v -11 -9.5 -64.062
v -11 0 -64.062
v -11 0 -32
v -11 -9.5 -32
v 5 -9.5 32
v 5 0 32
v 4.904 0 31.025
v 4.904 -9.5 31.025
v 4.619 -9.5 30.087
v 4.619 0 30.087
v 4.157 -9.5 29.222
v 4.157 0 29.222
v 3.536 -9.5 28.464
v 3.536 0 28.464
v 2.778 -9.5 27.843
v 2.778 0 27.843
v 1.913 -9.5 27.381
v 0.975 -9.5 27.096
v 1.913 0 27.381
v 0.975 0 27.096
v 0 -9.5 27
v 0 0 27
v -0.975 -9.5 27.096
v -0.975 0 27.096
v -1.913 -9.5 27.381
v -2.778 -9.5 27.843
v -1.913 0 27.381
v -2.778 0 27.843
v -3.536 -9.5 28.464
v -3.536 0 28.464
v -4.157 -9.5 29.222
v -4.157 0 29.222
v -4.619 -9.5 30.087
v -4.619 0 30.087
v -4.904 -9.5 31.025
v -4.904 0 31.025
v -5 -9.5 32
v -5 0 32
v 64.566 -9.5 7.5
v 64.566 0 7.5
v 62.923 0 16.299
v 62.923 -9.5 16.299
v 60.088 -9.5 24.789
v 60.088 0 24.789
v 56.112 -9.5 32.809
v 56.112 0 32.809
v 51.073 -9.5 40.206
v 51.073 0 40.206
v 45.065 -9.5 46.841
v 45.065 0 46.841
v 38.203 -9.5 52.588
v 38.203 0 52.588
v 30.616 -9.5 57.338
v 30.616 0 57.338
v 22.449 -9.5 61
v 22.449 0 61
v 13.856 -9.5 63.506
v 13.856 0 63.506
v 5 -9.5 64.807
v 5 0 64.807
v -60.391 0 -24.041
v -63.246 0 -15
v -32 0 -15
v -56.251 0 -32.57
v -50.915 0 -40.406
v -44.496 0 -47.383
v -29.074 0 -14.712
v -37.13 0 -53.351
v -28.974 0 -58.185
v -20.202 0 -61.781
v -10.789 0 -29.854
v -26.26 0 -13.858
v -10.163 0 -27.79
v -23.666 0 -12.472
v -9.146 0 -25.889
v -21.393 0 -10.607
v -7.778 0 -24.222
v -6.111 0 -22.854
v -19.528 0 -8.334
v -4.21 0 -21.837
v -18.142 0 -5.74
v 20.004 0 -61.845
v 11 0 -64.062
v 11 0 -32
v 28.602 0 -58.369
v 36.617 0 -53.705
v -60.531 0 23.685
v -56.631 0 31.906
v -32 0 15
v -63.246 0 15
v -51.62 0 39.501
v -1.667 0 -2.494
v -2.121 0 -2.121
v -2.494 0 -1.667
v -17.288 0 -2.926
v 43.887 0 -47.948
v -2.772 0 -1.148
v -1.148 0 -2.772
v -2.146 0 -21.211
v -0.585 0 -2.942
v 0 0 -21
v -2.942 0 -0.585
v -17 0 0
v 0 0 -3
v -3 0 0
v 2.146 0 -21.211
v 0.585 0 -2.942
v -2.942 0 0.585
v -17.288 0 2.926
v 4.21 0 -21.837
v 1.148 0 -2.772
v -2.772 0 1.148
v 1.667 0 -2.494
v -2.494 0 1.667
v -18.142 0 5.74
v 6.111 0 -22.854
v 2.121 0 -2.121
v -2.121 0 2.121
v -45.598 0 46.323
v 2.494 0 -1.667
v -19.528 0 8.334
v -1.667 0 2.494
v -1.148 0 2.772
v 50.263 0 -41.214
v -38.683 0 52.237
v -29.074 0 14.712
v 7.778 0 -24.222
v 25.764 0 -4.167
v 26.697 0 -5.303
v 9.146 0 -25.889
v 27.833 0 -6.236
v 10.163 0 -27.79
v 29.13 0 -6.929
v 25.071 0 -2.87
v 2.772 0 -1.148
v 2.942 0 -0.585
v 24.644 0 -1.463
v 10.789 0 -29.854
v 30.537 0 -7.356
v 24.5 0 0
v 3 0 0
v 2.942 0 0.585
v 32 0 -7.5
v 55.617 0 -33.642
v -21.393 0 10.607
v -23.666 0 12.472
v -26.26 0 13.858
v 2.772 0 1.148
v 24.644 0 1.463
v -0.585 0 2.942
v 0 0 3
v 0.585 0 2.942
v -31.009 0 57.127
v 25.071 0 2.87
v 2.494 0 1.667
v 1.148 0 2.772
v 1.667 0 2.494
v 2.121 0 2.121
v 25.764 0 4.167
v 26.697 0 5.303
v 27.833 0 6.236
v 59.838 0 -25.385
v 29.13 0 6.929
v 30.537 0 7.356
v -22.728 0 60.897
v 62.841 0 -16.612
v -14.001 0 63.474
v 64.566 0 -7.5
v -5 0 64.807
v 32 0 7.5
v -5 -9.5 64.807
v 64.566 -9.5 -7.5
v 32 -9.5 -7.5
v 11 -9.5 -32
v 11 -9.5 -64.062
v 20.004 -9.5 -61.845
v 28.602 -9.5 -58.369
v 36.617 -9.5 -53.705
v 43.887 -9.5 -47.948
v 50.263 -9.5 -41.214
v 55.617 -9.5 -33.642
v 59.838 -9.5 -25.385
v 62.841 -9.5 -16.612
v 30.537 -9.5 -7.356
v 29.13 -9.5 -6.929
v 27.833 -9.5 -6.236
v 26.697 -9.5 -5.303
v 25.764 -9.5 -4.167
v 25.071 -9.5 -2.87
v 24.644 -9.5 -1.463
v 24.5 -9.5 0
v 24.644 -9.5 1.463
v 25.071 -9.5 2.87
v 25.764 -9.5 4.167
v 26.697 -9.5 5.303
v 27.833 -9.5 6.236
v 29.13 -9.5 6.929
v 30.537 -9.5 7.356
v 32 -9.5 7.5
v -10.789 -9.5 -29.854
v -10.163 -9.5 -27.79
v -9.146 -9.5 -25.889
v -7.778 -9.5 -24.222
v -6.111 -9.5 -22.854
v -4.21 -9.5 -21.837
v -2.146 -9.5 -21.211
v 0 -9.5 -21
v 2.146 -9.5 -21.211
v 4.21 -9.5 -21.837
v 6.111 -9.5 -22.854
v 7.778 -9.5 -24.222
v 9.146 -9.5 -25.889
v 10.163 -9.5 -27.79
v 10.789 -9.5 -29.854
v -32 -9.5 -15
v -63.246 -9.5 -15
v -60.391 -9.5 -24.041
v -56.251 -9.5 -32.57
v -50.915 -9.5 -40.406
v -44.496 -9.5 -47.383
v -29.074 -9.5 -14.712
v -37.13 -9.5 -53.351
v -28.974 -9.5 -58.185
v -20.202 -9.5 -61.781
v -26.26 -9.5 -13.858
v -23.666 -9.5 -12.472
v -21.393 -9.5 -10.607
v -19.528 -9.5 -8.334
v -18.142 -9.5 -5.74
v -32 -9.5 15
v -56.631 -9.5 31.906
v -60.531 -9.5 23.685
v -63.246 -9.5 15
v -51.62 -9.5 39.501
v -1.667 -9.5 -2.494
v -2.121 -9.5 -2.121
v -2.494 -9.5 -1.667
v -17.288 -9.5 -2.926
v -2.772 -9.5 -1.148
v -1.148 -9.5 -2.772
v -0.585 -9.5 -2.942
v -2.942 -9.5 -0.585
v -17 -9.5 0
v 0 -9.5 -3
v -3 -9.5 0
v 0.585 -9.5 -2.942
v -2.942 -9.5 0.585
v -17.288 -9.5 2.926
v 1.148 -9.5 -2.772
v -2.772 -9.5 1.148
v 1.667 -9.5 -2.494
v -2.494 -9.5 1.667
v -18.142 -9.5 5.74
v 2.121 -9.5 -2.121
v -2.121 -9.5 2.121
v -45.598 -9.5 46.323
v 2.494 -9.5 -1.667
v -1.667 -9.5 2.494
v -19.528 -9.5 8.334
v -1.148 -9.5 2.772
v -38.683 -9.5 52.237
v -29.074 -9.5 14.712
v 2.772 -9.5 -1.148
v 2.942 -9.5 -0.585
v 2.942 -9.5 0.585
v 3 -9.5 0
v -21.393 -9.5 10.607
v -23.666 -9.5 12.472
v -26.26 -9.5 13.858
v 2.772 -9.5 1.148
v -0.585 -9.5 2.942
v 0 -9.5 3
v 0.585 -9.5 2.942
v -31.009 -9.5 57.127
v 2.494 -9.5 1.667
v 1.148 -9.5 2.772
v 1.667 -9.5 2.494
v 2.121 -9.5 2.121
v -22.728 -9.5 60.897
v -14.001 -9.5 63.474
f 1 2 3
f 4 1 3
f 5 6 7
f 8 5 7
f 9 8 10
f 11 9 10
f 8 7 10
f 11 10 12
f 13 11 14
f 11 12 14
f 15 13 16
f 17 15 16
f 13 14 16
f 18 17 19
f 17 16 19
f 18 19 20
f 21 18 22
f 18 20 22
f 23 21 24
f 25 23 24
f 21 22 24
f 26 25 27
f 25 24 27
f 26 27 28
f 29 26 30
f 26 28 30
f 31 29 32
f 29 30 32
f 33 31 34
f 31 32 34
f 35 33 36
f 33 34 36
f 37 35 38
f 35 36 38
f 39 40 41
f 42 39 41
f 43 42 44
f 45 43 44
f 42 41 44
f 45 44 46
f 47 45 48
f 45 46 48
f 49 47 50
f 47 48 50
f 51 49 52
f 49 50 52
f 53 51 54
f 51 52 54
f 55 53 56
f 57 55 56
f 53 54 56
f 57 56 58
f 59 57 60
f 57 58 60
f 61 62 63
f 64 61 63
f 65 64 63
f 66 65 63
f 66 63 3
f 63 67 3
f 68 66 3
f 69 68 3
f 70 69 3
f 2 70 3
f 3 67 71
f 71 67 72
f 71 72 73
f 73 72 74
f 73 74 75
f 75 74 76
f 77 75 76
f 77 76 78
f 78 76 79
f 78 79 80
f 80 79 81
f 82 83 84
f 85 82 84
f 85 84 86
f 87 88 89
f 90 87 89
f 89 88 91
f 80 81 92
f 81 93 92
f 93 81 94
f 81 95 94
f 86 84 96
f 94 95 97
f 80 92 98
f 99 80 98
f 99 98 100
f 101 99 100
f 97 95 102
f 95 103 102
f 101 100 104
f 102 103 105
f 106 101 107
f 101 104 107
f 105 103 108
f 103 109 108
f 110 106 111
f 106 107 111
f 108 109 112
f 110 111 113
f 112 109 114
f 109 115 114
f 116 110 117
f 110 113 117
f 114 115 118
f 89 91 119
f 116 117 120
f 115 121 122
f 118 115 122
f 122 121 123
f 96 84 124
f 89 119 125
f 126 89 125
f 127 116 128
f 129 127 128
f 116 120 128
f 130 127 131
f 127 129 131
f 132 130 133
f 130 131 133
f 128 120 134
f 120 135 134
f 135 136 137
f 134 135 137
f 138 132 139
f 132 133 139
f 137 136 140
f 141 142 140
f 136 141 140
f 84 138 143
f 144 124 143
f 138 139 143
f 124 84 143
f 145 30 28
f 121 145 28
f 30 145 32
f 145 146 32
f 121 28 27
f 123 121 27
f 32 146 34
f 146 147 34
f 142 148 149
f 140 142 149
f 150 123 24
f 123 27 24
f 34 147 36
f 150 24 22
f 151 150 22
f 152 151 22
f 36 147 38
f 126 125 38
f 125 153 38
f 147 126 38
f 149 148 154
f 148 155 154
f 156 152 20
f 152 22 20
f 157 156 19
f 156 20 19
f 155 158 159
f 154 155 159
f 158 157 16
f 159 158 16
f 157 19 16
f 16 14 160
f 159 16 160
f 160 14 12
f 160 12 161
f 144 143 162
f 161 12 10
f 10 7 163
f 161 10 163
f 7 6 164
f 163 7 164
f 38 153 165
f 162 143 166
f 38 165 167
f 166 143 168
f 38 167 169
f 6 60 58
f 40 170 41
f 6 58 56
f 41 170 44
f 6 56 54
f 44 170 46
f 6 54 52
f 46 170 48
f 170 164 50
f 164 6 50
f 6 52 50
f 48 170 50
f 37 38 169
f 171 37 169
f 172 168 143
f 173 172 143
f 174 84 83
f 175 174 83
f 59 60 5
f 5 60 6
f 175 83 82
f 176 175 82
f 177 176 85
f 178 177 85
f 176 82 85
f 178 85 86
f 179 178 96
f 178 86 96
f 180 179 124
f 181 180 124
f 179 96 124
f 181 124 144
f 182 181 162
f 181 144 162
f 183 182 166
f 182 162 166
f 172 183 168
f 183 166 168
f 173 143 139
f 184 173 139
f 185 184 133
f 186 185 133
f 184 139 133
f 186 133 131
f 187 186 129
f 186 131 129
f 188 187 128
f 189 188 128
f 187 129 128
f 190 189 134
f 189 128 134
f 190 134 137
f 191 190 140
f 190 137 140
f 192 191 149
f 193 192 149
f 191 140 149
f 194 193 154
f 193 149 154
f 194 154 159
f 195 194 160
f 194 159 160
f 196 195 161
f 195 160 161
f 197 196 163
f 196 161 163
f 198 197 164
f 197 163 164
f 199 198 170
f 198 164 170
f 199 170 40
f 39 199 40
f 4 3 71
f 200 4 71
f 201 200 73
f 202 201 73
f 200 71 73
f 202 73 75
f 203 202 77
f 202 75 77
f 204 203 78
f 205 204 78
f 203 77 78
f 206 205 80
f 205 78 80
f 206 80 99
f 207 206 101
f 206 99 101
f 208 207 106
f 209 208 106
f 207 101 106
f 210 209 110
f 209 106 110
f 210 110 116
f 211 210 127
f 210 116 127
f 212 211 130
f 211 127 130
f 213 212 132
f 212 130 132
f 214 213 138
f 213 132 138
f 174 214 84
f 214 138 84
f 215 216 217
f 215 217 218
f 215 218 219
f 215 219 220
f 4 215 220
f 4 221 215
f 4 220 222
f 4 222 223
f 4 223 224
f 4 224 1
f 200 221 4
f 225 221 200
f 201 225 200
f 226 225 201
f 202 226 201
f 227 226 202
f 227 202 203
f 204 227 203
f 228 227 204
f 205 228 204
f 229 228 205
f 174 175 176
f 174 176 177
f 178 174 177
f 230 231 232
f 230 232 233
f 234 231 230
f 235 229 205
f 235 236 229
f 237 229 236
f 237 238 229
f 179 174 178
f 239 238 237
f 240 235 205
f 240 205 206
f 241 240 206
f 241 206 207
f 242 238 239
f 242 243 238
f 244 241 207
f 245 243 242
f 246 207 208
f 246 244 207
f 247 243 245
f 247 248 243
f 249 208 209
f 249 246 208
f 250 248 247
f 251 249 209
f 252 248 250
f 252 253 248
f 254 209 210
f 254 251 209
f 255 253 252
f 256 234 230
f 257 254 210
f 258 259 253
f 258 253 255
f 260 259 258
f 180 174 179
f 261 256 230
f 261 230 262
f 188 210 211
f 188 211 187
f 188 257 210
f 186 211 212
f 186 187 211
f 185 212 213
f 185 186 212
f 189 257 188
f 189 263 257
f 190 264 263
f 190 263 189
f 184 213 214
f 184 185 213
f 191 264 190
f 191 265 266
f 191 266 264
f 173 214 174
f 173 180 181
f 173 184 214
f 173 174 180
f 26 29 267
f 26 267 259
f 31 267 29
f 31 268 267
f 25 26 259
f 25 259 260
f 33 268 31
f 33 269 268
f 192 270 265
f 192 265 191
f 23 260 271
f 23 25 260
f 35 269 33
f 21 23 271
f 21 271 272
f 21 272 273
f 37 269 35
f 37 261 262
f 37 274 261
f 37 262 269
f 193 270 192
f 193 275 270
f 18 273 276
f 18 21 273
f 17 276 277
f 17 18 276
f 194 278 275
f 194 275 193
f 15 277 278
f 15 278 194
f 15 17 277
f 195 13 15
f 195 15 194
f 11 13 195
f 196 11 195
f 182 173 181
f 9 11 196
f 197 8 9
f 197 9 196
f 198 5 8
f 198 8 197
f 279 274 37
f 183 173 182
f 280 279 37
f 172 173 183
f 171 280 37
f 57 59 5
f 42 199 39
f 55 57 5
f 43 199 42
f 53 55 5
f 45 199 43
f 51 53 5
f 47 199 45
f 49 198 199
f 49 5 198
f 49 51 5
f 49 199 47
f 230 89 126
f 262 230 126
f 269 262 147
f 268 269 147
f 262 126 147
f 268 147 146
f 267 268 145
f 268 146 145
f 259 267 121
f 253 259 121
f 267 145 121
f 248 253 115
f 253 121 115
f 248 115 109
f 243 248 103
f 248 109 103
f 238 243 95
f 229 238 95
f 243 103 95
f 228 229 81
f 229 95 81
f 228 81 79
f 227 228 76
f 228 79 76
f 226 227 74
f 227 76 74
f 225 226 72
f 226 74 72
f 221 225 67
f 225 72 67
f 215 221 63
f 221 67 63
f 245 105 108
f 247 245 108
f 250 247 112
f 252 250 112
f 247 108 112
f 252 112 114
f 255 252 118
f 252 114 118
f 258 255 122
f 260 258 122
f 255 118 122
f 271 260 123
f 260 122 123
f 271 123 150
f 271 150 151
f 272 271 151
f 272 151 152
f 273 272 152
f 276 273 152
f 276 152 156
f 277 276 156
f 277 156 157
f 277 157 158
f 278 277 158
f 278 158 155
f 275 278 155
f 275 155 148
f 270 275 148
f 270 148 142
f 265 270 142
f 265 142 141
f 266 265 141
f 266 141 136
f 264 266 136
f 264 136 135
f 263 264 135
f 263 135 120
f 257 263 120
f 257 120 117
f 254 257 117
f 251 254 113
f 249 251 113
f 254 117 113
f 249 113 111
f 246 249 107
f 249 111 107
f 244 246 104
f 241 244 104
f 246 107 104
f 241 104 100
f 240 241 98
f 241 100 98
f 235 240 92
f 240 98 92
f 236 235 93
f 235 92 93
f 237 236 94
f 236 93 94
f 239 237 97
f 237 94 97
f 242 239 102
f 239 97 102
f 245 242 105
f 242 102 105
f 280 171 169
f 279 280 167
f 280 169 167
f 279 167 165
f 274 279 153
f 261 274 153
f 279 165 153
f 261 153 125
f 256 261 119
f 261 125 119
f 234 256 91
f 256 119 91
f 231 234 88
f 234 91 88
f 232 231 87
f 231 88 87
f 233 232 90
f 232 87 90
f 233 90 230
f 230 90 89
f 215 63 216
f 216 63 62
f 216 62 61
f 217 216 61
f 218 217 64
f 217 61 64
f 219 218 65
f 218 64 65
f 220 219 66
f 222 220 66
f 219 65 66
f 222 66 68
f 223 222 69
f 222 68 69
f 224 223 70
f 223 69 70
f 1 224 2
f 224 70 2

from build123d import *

# Parameters (mm, degrees)
F1_DEPTH = 9.5
F3_D     = 6


with BuildPart() as f1:
    # F0 (on Front) → F1 (new body)
    with BuildSketch(Plane.XZ):
        with BuildLine():
            Line((11, -32), (11, -64.0624695122))
            ThreePointArc((11, -64.0624695122), (47.1951052283, -44.6947652695), (64.5658578507, -7.5))
            Line((64.5658578507, -7.5), (32, -7.5))
            ThreePointArc((32, -7.5), (24.5, 0), (32, 7.5))
            Line((32, 7.5), (64.5658578507, 7.5))
            ThreePointArc((64.5658578507, 7.5), (45.0653621802, 46.8413613334), (5, 64.8074069841))
            Line((5, 64.8074069841), (5, 32))
            ThreePointArc((5, 32), (0, 27), (-5, 32))
            Line((-5, 32), (-5, 64.8074069841))
            ThreePointArc((-5, 64.8074069841), (-42.2440330772, 49.4008266062), (-63.2455532034, 15))
            Line((-63.2455532034, 15), (-32, 15))
            ThreePointArc((-32, 15), (-17, 0), (-32, -15))
            Line((-32, -15), (-63.2455532034, -15))
            ThreePointArc((-63.2455532034, -15), (-44.4958652155, -47.3826759346), (-11, -64.0624695122))
            Line((-11, -64.0624695122), (-11, -32))
            ThreePointArc((-11, -32), (0, -21), (11, -32))
        make_face()
    extrude(amount=F1_DEPTH)

    # F3 (through all)
    with Locations(Plane.XZ.offset(9.5)):
        with Locations((0, 0)):
            Hole(F3_D / 2)


solid = f1.part
